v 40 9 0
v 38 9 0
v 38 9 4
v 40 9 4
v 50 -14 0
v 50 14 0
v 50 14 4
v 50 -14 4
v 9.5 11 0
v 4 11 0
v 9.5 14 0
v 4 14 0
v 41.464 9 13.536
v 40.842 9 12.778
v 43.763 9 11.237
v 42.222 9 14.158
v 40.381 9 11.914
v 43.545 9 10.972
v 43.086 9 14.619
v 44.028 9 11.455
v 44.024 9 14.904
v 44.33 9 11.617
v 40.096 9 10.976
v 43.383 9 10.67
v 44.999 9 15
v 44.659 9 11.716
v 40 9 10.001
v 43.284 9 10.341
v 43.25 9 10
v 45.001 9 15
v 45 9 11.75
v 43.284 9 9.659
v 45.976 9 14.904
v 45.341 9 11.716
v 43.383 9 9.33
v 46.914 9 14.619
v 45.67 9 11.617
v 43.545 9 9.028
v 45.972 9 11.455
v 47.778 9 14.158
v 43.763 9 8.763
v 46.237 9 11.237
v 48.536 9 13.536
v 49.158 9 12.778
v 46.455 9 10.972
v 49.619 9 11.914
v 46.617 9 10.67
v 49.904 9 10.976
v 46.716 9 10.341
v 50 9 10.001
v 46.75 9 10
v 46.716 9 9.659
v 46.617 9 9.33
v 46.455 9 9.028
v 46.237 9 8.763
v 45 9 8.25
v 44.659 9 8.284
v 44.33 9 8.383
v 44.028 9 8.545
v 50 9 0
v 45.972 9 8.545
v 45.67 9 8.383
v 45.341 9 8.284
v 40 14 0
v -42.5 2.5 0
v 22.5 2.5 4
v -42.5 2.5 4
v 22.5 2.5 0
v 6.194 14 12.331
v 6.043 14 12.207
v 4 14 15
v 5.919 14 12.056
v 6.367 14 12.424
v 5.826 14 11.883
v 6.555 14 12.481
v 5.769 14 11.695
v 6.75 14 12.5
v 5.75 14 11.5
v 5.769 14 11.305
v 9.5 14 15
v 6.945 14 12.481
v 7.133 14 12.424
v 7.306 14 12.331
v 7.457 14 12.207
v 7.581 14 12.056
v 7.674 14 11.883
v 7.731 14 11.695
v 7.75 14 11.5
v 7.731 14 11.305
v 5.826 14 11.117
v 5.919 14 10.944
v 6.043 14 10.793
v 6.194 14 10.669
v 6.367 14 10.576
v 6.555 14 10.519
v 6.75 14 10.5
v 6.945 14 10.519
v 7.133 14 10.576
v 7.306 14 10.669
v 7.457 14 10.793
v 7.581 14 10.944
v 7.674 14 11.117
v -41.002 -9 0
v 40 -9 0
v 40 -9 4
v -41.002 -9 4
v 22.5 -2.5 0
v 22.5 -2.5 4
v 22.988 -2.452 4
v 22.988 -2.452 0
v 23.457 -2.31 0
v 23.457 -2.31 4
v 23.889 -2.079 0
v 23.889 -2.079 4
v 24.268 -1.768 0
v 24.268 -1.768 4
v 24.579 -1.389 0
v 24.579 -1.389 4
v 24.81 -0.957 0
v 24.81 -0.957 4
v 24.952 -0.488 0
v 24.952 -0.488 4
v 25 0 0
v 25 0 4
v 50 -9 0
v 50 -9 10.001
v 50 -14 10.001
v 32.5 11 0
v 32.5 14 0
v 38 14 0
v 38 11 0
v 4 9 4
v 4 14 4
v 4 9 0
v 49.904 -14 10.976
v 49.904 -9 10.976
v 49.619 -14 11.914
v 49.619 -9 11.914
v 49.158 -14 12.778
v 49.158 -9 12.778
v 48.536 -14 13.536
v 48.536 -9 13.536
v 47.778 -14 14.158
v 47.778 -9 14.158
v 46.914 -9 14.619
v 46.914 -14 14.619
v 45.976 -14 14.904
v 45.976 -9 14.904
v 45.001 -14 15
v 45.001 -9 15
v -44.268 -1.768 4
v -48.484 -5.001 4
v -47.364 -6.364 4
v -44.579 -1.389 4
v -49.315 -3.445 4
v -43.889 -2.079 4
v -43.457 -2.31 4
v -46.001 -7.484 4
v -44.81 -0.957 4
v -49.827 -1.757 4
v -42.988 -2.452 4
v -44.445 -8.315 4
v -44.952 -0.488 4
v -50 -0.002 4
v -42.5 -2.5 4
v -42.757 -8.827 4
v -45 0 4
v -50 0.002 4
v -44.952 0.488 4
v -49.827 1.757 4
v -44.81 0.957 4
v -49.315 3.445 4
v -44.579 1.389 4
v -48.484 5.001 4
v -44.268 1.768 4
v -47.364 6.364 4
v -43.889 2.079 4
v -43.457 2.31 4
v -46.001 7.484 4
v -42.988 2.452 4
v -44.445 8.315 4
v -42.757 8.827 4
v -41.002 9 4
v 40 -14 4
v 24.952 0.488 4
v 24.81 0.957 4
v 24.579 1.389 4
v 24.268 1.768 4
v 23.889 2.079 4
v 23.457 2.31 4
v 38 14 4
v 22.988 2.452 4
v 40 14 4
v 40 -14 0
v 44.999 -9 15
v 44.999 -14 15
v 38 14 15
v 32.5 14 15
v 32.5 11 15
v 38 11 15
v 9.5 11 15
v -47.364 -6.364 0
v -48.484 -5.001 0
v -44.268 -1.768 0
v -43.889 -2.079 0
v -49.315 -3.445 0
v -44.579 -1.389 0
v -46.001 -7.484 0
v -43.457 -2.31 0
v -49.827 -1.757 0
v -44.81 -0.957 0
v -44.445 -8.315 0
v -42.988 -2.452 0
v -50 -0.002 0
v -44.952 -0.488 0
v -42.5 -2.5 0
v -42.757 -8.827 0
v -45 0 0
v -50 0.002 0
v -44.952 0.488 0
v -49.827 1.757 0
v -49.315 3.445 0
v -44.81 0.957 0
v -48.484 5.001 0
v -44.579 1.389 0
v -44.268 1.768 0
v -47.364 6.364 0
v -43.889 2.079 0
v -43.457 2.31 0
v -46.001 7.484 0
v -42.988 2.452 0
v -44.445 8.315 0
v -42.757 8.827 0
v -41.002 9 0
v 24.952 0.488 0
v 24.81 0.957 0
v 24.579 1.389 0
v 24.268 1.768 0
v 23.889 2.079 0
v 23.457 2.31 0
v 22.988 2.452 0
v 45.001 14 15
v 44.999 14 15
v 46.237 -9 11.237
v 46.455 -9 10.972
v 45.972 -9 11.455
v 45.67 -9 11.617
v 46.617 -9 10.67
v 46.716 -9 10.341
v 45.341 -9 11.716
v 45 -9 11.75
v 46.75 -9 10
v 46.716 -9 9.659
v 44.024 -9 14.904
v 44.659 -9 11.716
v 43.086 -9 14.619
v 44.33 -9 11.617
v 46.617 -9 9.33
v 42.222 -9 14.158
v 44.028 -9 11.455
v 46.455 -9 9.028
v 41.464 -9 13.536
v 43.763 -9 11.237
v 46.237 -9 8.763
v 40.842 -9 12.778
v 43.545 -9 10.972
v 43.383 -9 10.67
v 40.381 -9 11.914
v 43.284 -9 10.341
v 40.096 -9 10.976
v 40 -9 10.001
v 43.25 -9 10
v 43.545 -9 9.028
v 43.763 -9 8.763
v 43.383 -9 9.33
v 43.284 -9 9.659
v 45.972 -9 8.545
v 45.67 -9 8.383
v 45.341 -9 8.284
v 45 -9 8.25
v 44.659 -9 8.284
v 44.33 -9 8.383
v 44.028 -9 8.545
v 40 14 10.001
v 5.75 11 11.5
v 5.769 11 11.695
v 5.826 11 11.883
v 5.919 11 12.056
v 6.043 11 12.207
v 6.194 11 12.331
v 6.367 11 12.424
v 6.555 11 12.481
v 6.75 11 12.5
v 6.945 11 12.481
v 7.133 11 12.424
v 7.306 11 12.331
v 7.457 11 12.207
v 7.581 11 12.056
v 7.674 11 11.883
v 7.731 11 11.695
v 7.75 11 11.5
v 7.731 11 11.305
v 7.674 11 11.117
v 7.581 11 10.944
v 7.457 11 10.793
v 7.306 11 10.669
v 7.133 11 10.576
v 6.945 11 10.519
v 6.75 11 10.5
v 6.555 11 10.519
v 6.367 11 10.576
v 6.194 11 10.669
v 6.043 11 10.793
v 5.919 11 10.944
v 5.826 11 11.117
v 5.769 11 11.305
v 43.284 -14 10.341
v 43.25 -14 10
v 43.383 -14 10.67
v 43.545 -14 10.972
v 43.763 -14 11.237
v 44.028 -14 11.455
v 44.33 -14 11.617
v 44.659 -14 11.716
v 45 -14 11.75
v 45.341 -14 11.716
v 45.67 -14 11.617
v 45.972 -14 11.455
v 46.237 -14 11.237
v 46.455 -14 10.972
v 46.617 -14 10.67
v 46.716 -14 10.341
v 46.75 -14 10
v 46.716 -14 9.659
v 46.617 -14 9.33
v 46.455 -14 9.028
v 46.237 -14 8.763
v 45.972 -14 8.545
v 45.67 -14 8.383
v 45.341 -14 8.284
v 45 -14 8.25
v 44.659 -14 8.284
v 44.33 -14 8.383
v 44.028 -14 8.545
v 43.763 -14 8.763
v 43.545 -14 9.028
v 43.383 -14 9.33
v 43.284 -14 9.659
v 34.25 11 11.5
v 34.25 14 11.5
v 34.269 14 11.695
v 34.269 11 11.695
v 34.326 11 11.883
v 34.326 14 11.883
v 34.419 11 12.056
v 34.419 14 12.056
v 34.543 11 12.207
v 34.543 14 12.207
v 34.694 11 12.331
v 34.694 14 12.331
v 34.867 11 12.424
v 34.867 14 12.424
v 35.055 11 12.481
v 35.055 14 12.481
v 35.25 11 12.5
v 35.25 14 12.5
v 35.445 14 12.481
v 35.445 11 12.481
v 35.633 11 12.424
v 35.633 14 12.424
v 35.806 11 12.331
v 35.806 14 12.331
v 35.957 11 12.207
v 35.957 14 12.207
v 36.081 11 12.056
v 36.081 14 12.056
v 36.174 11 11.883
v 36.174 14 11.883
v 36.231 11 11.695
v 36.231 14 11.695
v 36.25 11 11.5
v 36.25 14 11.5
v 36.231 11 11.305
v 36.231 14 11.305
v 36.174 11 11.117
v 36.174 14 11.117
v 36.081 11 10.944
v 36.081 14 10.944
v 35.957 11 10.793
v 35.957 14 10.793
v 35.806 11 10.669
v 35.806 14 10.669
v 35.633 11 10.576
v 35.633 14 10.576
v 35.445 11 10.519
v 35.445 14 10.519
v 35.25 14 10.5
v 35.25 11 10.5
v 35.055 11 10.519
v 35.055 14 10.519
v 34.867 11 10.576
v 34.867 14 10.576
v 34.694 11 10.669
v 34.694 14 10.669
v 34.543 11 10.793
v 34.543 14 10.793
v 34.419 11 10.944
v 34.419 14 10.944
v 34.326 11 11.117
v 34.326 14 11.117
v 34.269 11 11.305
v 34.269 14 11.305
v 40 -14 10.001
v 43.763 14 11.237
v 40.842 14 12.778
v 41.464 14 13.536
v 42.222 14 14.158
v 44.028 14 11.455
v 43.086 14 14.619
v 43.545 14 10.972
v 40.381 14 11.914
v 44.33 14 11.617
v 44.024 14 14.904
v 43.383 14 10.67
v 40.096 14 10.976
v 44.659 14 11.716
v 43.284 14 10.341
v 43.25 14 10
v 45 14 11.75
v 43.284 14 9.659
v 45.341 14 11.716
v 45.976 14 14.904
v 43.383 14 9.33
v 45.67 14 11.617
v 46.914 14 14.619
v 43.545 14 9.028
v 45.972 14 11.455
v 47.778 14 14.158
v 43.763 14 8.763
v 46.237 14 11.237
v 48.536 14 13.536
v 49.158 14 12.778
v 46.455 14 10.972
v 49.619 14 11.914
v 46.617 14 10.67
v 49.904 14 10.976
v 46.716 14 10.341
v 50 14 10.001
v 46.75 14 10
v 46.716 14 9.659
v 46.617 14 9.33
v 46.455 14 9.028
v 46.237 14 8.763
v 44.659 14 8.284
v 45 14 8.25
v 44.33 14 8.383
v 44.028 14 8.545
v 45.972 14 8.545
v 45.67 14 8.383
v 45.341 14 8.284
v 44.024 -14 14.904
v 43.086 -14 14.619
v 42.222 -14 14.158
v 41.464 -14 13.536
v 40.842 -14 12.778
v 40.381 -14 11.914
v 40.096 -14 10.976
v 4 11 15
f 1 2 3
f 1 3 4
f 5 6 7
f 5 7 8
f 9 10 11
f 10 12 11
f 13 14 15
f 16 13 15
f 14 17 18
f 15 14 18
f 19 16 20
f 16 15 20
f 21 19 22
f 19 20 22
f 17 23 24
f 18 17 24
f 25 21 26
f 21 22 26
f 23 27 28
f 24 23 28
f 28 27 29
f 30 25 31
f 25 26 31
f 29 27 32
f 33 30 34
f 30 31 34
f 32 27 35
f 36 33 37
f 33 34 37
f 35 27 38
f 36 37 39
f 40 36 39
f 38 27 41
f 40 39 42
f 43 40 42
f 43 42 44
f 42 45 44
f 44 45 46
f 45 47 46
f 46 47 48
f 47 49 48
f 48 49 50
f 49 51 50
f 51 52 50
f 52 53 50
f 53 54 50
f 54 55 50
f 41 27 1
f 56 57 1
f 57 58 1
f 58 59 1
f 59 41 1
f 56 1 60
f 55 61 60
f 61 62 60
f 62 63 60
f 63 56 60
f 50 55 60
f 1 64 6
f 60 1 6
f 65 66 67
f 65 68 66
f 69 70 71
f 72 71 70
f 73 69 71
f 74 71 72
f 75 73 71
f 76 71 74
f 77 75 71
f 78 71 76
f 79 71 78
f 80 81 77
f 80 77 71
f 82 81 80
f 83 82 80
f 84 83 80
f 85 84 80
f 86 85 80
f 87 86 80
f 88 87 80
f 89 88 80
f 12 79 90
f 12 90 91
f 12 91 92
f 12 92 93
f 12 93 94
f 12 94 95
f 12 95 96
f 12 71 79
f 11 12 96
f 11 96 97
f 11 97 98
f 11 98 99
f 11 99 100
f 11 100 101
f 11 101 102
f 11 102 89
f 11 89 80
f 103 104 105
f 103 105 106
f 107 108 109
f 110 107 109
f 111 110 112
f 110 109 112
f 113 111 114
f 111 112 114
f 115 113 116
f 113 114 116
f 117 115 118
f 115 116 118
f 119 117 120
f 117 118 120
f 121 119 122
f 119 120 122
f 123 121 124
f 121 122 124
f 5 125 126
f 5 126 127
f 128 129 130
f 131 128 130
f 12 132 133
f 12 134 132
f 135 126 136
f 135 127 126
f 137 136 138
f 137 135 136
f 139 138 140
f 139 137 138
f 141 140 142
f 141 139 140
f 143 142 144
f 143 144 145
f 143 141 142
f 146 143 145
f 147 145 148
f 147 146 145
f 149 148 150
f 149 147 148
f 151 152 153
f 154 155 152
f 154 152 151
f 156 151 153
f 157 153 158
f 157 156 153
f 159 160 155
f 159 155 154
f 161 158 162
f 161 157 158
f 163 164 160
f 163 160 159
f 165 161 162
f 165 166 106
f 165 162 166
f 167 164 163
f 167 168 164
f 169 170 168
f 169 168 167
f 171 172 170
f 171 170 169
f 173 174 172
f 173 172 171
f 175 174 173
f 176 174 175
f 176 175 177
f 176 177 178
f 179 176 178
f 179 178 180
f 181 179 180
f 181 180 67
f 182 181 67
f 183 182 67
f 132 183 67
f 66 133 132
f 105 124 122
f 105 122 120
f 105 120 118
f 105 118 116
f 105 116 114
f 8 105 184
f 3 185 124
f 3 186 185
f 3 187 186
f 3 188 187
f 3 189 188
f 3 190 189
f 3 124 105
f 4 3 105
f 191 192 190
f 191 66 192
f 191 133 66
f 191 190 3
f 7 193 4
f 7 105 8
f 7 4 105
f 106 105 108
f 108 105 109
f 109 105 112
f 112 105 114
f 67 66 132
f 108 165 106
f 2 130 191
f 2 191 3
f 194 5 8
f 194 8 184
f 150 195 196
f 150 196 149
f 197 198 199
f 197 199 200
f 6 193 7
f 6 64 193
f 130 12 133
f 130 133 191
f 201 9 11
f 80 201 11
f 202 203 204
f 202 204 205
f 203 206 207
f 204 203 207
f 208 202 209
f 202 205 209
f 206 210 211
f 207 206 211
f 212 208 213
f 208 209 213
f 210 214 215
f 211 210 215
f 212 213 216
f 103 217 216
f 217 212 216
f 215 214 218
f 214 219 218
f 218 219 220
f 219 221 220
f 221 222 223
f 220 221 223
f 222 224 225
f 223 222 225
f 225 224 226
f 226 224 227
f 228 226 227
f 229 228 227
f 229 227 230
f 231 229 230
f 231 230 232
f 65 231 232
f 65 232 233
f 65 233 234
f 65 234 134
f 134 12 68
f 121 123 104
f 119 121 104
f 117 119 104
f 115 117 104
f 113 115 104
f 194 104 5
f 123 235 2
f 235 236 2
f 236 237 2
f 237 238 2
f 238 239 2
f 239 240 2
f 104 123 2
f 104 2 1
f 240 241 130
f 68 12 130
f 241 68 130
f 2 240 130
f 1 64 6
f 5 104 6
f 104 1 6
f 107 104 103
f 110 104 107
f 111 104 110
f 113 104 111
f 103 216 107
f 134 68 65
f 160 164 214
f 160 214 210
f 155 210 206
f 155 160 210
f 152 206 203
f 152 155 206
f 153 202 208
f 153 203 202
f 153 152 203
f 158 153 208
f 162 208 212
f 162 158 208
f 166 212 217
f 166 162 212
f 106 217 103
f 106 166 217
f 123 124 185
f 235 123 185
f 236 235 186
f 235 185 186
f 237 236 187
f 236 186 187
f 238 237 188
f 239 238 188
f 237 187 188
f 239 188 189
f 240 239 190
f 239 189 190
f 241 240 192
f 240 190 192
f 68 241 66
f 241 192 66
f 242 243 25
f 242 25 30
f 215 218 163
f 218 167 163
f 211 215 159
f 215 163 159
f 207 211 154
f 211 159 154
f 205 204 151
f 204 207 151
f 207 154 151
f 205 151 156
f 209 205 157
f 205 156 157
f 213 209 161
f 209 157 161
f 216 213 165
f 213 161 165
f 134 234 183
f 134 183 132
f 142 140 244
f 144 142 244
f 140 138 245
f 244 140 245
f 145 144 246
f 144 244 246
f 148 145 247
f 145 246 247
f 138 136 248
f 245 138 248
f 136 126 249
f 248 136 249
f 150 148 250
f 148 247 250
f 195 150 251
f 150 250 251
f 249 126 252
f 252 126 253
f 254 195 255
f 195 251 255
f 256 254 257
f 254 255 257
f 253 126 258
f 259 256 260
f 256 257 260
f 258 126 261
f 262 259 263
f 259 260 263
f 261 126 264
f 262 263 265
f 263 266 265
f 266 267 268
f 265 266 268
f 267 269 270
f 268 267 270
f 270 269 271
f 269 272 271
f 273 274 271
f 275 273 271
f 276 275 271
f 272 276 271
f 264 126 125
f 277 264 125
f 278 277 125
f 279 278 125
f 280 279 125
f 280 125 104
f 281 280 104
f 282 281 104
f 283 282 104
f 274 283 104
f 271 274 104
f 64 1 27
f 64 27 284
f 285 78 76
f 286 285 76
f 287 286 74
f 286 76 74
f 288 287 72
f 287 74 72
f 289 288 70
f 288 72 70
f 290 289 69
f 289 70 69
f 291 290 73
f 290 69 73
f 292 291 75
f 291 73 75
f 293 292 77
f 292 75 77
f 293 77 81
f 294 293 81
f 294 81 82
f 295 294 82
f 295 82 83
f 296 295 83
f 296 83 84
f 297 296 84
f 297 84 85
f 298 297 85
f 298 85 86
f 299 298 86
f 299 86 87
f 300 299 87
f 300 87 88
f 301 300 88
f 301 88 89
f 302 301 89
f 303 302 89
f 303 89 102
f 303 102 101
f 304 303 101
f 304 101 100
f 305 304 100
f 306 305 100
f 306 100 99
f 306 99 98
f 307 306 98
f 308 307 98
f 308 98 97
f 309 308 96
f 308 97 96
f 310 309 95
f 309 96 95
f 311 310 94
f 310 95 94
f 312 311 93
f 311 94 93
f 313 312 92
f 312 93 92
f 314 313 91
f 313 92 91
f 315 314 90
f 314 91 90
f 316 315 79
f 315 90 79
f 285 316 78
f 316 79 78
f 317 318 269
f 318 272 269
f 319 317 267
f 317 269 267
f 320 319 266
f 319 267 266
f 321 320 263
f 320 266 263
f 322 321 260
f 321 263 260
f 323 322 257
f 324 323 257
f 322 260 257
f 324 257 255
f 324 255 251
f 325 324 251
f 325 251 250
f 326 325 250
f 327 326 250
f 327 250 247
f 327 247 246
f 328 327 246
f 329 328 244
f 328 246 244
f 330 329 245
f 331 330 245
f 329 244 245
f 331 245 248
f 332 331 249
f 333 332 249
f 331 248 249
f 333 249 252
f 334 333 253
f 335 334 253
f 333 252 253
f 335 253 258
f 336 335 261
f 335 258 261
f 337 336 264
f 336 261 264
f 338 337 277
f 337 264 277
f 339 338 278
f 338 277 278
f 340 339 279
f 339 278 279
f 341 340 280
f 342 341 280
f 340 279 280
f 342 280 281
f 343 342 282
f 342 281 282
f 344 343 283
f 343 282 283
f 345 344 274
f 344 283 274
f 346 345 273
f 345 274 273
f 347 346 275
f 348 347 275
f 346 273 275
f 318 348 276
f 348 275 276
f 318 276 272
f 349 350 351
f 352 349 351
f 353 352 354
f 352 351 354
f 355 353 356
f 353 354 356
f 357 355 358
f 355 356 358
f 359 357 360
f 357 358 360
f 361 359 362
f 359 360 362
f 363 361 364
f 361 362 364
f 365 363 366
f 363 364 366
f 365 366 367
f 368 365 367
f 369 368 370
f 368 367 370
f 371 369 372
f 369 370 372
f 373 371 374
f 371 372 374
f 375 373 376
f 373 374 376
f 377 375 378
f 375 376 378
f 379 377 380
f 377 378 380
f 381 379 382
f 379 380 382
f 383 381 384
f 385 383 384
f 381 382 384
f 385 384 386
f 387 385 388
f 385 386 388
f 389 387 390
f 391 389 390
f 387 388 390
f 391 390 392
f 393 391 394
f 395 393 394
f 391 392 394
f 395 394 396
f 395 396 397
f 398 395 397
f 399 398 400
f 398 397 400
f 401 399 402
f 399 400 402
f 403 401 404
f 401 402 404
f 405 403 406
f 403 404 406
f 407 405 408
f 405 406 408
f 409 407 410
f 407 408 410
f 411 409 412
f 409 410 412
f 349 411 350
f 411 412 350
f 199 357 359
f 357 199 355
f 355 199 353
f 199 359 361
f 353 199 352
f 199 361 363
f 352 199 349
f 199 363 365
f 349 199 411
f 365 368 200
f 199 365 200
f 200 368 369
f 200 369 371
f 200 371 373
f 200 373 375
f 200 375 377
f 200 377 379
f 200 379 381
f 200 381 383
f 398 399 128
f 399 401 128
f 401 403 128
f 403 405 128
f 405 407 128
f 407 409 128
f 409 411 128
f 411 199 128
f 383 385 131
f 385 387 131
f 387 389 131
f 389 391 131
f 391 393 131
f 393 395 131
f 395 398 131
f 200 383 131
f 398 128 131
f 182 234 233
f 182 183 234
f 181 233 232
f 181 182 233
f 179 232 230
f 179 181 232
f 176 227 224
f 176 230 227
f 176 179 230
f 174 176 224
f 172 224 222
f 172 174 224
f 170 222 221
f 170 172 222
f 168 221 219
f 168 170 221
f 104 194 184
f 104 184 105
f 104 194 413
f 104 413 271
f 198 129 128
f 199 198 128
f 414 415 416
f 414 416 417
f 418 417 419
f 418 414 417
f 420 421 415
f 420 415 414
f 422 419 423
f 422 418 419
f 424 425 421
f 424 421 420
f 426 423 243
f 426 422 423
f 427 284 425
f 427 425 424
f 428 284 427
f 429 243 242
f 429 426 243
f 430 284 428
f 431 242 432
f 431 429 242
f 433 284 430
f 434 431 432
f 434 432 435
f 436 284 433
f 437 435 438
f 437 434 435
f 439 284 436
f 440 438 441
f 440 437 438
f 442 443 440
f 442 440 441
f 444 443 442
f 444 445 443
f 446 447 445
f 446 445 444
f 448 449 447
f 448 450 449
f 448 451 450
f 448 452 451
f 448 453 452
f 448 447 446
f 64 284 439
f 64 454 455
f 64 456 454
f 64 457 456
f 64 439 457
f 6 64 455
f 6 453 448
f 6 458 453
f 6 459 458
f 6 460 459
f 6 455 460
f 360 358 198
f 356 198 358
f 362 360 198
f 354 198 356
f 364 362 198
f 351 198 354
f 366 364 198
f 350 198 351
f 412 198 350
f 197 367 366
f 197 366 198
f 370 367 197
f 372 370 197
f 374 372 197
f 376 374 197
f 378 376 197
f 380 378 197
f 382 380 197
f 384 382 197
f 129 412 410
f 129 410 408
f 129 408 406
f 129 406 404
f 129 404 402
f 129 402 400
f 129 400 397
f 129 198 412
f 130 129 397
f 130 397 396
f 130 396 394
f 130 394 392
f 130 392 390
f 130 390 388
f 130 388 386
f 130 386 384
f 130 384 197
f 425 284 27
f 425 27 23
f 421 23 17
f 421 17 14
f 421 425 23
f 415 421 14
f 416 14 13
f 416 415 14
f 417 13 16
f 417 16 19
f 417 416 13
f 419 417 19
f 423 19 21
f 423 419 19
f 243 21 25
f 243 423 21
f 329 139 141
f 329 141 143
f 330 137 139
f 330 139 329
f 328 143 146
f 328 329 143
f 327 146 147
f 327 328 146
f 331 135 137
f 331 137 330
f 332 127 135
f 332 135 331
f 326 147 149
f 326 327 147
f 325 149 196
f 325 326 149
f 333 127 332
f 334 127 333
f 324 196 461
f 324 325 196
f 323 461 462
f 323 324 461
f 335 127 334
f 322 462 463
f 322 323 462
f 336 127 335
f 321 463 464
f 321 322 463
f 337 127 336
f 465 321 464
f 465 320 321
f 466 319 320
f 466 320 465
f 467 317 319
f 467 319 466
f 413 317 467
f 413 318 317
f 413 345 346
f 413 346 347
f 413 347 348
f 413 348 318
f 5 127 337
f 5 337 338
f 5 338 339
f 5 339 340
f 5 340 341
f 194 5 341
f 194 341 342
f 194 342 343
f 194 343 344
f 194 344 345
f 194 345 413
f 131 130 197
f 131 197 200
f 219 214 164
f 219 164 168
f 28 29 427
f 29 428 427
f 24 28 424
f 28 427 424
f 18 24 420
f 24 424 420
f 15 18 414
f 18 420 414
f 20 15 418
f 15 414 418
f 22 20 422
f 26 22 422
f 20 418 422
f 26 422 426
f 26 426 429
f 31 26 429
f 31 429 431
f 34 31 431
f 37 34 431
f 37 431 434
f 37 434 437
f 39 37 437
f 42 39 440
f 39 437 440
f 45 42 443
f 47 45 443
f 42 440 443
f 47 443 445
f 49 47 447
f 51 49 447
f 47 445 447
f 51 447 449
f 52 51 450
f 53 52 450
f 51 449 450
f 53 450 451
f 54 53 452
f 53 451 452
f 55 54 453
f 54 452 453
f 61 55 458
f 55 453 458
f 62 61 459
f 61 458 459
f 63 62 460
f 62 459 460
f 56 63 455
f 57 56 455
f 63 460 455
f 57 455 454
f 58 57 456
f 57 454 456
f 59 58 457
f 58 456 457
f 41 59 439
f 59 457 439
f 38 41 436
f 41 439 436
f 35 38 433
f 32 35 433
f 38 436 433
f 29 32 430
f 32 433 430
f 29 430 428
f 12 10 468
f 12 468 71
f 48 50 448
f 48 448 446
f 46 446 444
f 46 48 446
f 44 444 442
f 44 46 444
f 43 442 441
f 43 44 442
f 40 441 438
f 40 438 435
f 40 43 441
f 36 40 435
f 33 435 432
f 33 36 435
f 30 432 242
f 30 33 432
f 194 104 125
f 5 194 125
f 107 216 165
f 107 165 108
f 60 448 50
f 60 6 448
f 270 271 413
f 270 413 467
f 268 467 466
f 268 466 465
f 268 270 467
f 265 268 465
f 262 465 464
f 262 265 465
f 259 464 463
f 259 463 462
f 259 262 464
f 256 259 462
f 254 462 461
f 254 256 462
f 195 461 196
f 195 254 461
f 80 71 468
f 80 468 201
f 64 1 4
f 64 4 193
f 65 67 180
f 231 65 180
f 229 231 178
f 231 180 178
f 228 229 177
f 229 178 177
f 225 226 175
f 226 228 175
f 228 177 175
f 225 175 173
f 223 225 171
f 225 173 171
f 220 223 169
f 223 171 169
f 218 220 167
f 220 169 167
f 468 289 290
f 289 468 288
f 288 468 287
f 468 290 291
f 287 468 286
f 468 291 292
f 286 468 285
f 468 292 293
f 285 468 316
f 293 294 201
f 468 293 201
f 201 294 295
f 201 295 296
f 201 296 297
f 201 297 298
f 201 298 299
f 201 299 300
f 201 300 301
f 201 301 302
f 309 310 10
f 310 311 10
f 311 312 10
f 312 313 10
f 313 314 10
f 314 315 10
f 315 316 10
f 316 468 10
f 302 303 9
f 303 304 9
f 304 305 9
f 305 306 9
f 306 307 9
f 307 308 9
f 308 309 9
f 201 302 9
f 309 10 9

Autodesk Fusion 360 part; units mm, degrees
sketch "Sketch1" plane through (0, 0, 0) normal (0, 0, 1) x (1, 0, 0)
  line L0 (50, -9) -> (-50, -9)
  line L1 (-50, -9) -> (-50, 9)
  line L2 (-50, 9) -> (50, 9)
  line L3 (50, 9) -> (50, -9)
  line L4 (50, -9) -> (-50, 9) construction
  line L5 (-50, -9) -> (50, 9) construction
  line L6 (40, 14) -> (50, 14)
  line L7 (50, 14) -> (50, -14)
  line L8 (50, -14) -> (40, -14)
  line L9 (40, -14) -> (40, 14)
  line L10 (4, 14) -> (38, 14)
  line L11 (38, 14) -> (38, 9)
  line L12 (38, 9) -> (4, 9)
  line L13 (4, 9) -> (4, 14)
  line L14 (38, 14) -> (4, 14)
  line L15 (4, 14) -> (4, 11)
  line L16 (4, 11) -> (38, 11)
  line L17 (38, 11) -> (38, 14)
  line L18 (9.5, 14) -> (32.5, 14)
  line L19 (32.5, 14) -> (32.5, 11)
  line L20 (32.5, 11) -> (9.5, 11)
  line L21 (9.5, 11) -> (9.5, 14)
  line L22 (50, 14) -> (40, -14) construction
  line L23 (-50, 0) -> (40, 0) construction
  line L24 (25, 2.5) -> (-45, 2.5)
  line L25 (-45, 2.5) -> (-45, -2.5)
  line L26 (-45, -2.5) -> (25, -2.5)
  line L27 (25, -2.5) -> (25, 2.5)
  line L28 (25, 2.5) -> (-45, -2.5) construction
  line L29 (-45, 2.5) -> (25, -2.5) construction
  point P0 (-10, 0)
  dimension "d1" = 100
  dimension "d2" = 18
  dimension "d3" = 28
  dimension "d4" = 10
  dimension "d5" = 5
  dimension "d6" = 34
  dimension "d7" = 3
  dimension "d8" = 5
  dimension "d9" = 5.5
  dimension "d10" = 5.5
  dimension "d12" = 2
  dimension "d13" = 70
  dimension "d14" = 5
  dimension "d15" = 5
extrude "Extrude1" add sketch "Sketch1" along normal blind 4 makes body 1
extrude "Extrude2" add sketch "Sketch1" along normal blind 15 separate body contours L0 L7 L8 L9 | L2 L6 L7 L9 | L10 L11 L14 L16 L17 L19 | L10 L13 L14 L15 L16 L21 makes body 2 at (46.6667, -14, 5) makes body 3 at (34.3333, 11, 5) makes body 4 at (43.3333, 9, 5) makes body 5 at (5.8333, 14, 5)
fillet "Fillet1" radius 5 4 edges at (40, -11.5, 15) (50, -11.5, 15) (40, 11.5, 15) (50, 11.5, 15) on bodies 2 4
fillet "Fillet2" radius 9 2 edges at (-50, 9, 2) (-50, -9, 2) on bodies 1
fillet "Fillet3" radius 2.5 4 edges at (-45, 2.5, 2) (-45, -2.5, 2) (25, 2.5, 2) (25, -2.5, 2) on bodies 1
sketch "Sketch2" plane through (0, 14, 0) normal (0, 1, 0) x (-1, 0, 0)
  arc A0 (-40, 10) -> (-50, 10) centre (-45, 10) ccw
  line L0 (-50, 10) -> (-50, 0)
  line L1 (-50, 0) -> (-40, 0)
  line L2 (-40, 0) -> (-40, 10)
  circle A1 centre (-45, 10) radius 1.75
  dimension "d26" = 3.5
extrude "Extrude3" cut sketch "Sketch2" against normal through all contours A1 bodies 2 4
sketch "Sketch3" plane through (0, 14, 0) normal (0, 1, 0) x (-1, 0, 0)
  line L0 (-9.5, 0) -> (-4, 0)
  line L1 (-4, 0) -> (-4, 15)
  line L2 (-4, 15) -> (-9.5, 15)
  line L3 (-9.5, 15) -> (-9.5, 0)
  line L4 (-6.75, 15) -> (-6.75, 9)
  line L5 (-35.25, 17.6448) -> (-35.25, 12.3552)
  line L6 (-38, 15) -> (-32.5, 15)
  circle A0 centre (-35.25, 11.5) radius 1
  circle A1 centre (-6.75, 11.5) radius 1
  line L7 (-1, 11.5) -> (-39, 11.5) construction
  dimension "d28" = 3.5
  dimension "d29" = 2
  dimension "d30" = 2
extrude "Extrude4" cut sketch "Sketch3" against normal through all contours L4 A1 | L4 A1 | A0 bodies 3 5
equation "d30 = d29"
